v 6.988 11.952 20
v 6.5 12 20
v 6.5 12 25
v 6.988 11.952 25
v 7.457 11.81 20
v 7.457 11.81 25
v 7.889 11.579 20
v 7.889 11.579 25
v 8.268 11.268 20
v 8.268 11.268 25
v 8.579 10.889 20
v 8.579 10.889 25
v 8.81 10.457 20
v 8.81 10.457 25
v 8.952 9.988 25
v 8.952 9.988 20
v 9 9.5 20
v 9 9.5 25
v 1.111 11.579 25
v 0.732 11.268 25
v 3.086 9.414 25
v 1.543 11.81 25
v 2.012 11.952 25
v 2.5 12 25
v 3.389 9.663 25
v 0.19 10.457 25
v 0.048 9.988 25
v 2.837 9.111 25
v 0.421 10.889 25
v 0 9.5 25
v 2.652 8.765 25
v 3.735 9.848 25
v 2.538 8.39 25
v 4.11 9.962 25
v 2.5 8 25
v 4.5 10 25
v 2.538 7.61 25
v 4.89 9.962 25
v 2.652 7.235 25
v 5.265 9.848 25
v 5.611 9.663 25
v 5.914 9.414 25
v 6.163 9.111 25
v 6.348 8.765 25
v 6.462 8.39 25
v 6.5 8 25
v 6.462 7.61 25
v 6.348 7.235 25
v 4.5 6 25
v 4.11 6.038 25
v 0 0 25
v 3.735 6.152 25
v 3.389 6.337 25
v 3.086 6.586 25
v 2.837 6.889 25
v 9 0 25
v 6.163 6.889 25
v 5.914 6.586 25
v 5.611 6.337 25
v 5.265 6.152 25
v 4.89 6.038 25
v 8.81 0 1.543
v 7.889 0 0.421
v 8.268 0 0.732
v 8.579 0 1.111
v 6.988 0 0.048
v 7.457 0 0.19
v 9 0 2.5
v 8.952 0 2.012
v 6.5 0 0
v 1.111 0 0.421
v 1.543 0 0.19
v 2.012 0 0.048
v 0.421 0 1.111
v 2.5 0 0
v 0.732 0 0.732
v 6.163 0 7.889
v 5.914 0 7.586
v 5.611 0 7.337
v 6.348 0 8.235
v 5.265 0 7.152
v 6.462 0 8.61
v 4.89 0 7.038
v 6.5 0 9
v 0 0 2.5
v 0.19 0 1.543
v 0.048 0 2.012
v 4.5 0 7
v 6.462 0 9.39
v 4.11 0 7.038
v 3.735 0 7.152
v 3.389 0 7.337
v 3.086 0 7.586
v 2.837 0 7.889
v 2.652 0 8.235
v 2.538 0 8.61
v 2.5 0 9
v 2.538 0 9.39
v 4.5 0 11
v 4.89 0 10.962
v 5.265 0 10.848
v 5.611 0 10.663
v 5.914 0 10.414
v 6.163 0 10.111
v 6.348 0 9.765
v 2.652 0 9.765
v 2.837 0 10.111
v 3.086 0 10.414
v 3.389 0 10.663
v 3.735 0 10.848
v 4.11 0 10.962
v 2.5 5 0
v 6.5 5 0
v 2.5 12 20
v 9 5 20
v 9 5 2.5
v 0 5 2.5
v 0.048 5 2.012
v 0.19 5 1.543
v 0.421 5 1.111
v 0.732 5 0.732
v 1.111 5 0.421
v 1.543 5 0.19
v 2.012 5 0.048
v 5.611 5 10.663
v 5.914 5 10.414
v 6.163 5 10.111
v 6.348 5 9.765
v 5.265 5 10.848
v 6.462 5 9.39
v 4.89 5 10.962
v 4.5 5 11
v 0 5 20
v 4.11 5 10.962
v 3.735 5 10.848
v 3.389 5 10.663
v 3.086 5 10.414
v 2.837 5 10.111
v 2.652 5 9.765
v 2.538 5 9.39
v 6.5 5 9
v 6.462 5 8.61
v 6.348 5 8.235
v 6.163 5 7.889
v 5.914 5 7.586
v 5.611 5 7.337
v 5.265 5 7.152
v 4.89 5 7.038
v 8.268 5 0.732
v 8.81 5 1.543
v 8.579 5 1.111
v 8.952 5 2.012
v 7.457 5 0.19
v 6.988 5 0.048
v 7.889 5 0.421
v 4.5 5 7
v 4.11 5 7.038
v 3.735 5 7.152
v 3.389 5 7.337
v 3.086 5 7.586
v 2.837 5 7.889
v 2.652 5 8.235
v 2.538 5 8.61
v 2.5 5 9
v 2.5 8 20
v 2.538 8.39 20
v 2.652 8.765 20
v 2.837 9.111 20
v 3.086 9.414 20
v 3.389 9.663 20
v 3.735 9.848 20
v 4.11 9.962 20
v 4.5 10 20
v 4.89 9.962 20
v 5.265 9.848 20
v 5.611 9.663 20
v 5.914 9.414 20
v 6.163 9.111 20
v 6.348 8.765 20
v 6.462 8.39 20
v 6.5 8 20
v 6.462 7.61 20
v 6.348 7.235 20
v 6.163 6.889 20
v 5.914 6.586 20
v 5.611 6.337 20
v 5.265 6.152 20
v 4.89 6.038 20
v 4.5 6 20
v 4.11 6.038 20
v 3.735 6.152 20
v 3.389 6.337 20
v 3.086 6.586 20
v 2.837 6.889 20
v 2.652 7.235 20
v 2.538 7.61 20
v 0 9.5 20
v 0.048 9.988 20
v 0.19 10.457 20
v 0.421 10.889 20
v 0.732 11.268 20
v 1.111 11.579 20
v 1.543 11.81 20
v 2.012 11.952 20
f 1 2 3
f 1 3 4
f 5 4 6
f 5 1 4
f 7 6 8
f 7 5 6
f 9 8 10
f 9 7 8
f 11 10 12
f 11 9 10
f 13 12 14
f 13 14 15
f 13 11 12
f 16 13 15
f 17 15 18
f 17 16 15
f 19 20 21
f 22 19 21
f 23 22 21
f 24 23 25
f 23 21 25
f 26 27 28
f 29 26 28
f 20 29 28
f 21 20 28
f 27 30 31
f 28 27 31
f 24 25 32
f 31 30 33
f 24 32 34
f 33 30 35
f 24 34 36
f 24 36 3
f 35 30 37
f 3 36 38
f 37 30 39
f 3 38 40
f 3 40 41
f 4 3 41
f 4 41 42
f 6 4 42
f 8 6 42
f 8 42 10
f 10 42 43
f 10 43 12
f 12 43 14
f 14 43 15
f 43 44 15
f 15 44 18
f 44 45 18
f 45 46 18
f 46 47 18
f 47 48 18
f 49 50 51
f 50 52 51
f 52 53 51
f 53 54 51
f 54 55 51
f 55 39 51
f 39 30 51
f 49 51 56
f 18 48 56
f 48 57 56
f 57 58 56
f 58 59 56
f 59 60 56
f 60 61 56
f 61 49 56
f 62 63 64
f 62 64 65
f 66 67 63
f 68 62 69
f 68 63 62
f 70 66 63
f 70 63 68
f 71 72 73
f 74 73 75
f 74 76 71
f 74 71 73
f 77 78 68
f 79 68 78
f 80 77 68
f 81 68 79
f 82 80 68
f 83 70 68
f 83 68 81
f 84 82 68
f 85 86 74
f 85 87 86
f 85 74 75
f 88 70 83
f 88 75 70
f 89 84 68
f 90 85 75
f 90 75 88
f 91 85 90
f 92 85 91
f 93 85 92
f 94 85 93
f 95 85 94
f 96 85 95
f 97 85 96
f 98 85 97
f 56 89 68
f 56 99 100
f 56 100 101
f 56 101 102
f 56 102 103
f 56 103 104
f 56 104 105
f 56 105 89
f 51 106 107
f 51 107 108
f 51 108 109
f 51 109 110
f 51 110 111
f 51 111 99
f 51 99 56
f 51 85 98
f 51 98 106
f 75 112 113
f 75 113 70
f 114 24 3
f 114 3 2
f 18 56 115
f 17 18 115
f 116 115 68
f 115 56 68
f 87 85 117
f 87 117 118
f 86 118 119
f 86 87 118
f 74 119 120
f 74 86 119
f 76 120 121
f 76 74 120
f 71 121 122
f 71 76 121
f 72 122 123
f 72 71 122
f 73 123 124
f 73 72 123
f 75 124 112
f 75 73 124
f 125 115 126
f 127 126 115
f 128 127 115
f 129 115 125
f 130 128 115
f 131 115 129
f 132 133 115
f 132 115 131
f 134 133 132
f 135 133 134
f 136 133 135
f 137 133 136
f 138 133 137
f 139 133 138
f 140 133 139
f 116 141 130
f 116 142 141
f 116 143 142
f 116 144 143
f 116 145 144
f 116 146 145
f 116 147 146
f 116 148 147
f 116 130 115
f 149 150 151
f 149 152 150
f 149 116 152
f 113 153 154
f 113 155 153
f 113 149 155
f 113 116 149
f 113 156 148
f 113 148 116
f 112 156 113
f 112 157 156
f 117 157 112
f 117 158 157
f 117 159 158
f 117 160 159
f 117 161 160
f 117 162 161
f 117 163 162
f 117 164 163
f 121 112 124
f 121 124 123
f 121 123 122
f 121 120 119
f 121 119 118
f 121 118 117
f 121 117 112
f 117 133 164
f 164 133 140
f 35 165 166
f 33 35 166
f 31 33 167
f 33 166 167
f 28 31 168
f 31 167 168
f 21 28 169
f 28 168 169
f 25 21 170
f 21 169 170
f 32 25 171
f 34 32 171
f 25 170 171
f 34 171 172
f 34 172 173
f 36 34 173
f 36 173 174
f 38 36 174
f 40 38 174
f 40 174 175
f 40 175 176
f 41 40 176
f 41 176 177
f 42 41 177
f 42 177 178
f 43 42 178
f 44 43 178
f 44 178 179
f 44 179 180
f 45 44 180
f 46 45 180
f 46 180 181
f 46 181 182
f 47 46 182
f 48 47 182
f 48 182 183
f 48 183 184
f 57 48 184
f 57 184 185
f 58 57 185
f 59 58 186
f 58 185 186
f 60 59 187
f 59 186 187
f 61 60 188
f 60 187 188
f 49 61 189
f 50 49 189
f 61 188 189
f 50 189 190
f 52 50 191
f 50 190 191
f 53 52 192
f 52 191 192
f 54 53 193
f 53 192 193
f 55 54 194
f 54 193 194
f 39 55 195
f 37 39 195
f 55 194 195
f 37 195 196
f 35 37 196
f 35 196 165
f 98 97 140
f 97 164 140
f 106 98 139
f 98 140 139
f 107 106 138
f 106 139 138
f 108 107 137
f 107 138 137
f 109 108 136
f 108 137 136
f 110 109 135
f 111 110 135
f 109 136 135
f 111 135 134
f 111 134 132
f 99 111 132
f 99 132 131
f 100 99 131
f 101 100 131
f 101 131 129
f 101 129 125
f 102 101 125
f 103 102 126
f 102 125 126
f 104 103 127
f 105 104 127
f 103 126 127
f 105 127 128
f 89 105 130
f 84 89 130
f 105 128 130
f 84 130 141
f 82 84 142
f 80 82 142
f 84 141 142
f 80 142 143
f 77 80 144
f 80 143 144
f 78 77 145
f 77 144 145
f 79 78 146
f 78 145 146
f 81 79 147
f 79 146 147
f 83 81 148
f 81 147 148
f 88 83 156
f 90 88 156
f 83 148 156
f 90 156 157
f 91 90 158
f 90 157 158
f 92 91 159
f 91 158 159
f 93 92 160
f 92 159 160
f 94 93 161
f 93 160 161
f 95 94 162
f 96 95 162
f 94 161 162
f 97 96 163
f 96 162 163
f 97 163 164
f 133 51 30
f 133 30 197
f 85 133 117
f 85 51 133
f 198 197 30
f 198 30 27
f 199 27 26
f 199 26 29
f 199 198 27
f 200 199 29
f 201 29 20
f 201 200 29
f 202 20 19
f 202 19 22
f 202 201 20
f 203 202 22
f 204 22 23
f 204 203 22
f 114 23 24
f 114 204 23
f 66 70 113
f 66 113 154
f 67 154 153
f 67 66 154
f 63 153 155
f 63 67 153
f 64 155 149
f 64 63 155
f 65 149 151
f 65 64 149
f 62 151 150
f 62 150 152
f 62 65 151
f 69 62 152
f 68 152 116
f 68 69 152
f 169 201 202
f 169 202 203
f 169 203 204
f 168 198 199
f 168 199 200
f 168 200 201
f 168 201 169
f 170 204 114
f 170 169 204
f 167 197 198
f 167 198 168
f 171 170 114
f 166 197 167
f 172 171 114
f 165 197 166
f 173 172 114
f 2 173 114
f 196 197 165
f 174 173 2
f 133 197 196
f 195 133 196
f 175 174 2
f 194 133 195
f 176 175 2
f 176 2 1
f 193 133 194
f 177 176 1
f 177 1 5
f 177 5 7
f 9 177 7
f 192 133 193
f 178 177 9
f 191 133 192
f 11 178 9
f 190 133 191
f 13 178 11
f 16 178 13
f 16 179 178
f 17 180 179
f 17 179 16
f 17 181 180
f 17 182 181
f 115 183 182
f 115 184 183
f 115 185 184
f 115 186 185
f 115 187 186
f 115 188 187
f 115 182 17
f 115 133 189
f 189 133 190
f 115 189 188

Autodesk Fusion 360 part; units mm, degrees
sketch "Sketch1" plane through (0, 0, 0) normal (1, 0, 0) x (0, 0, -1)
  line L0 (0, 0) -> (-25, 0)
  line L1 (-25, 0) -> (-25, 11)
  line L2 (-25, 11) -> (-20, 11)
  line L3 (0, 5) -> (0, 0)
  line L4 (0, 0) -> (0, 5)
  line L5 (-20, 5) -> (-20, 11)
  line L6 (-20, 5) -> (0, 5)
  point P0 (0, 5)
  point P1 (-20, 11)
  point P2 (-20, 5)
  point P3 (-25, 11)
  point P4 (-25, 0)
extrude "Extrude1" add sketch "Sketch1" along normal blind 9
sketch "Sketch2" plane through (0, 0, 20) normal (0, 0, -1) x (-1, 0, 0)
  line L0 (0, 5) -> (0, 11)
  line L1 (0, 11) -> (-9, 11)
  line L2 (-9, 11) -> (-9, 5)
  line L3 (-9, 5) -> (0, 5)
  circle A0 centre (-4.5, 8) radius 2
  dimension "d9" = 4
  dimension "d11" = 4.5
sketch "Sketch3" plane through (0, 5, 0) normal (0, 1, 0) x (-1, 0, 0)
  line L0 (0, 0) -> (0, 20)
  line L1 (0, 20) -> (-9, 20)
  line L2 (-9, 20) -> (-9, 0)
  line L3 (-9, 0) -> (0, 0)
  circle A0 centre (-4.5, 9) radius 2
  dimension "d12" = 4
  dimension "d14" = 4.5
extrude "Extrude2" cut sketch "Sketch3" against normal blind 13 contours A0
extrude "Extrude3" cut sketch "Sketch2" against normal blind 11 contours A0
fillet "Fillet1" radius 2.5 1 edges at (0, 2.5, 0)
fillet "Fillet2" radius 2.5 1 edges at (9, 2.5, 0)
extrude "Extrude4" add 1 faces at (6, 11, 23.3333) along direction (0, 1, 0) blind 1
fillet "Fillet3" radius 2.5 1 edges at (0, 12, 22.5)
fillet "Fillet4" radius 2.5 1 edges at (9, 12, 22.5)
